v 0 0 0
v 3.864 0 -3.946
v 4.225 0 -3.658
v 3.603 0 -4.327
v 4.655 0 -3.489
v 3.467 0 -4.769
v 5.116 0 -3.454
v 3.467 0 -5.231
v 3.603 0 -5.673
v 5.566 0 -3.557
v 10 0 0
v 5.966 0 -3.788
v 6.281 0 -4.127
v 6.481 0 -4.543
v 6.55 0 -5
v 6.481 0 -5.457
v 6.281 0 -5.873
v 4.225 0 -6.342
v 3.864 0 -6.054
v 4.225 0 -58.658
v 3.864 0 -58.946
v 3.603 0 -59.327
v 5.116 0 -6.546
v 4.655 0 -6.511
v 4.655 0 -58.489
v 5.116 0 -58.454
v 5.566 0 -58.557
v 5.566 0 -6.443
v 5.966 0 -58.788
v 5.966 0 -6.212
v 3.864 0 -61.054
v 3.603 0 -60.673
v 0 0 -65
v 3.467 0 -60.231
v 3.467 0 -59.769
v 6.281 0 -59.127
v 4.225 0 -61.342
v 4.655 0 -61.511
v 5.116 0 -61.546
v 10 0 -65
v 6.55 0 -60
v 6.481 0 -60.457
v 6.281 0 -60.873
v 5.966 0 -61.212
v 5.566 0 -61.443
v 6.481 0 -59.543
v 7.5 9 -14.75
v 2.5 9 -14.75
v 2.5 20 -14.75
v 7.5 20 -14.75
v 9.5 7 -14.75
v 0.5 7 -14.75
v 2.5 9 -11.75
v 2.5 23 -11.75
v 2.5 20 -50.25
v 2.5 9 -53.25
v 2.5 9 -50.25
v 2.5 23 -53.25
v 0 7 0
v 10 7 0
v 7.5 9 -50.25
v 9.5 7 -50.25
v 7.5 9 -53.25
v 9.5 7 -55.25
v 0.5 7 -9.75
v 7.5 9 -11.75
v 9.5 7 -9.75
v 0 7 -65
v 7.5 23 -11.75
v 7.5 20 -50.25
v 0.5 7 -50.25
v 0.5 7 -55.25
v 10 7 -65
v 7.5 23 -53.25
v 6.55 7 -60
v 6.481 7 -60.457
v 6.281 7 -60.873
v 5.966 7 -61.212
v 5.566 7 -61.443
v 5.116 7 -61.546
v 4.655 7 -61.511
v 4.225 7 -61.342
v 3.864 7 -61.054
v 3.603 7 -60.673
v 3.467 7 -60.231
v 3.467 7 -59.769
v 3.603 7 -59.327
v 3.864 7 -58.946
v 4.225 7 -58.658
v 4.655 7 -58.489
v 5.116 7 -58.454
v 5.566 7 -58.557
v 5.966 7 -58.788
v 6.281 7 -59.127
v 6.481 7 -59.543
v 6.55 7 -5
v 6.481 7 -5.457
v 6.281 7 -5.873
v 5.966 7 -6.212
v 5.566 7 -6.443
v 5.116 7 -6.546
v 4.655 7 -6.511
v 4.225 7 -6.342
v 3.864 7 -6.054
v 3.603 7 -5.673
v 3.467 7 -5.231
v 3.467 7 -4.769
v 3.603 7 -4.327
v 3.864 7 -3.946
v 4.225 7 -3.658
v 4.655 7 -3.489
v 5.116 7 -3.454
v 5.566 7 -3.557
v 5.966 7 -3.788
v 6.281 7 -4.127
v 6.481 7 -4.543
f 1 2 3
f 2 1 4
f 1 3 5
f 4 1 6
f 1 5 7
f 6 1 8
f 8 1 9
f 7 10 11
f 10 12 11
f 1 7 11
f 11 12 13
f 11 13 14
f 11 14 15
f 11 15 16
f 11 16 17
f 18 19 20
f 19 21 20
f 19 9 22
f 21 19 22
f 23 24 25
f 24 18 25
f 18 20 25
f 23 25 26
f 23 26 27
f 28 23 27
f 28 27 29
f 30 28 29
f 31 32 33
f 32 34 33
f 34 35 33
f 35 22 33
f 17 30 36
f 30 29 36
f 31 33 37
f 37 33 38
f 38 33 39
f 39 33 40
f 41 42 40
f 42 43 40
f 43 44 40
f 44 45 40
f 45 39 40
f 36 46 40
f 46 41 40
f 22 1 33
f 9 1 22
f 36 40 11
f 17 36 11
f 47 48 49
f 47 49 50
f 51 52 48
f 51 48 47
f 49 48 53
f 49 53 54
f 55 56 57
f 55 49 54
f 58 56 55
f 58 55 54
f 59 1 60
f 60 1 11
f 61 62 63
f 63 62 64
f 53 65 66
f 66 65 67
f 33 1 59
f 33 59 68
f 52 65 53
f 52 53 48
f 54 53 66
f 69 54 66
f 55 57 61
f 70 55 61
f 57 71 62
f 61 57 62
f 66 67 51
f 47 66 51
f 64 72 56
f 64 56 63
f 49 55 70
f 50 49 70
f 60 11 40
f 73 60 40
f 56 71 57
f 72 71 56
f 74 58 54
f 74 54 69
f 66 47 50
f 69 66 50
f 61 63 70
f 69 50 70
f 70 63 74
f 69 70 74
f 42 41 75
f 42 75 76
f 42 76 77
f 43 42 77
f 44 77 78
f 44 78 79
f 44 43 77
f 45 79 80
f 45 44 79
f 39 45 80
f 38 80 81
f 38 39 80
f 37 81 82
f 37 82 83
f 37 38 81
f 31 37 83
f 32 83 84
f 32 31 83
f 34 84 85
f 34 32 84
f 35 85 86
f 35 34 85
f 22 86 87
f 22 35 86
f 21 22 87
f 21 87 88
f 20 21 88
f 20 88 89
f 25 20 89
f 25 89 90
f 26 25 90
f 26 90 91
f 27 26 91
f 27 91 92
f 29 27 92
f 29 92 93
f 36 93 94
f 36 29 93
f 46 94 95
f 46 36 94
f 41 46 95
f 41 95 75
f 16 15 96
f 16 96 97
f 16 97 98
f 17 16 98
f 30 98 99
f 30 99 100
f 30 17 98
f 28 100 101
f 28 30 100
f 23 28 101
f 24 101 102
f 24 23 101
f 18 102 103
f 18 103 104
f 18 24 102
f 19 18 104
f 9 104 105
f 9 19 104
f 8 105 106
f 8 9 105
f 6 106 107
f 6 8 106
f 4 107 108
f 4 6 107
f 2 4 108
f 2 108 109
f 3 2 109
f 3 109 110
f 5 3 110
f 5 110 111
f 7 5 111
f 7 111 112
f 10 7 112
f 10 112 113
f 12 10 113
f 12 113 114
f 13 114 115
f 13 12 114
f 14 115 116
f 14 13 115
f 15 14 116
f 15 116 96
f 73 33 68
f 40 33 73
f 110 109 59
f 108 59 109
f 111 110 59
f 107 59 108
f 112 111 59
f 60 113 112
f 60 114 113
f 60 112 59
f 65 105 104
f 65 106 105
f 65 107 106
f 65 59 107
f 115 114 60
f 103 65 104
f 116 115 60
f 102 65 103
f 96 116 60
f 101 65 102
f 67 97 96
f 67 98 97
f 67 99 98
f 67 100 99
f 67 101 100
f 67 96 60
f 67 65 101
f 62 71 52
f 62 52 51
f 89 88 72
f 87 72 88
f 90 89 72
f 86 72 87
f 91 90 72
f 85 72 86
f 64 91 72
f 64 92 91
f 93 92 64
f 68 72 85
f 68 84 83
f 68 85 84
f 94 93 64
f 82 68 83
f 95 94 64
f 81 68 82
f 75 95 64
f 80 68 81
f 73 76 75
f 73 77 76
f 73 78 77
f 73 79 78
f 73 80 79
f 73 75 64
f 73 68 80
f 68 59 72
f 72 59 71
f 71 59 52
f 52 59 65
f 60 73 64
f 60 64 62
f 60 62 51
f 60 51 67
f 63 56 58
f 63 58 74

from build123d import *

# Parameters (mm, degrees)
SKETCH1_W           = 10
SKETCH1_H           = 65
SKETCH1_R           = 1.55
BOSS_EXTRUDE1_DEPTH = 7
SKETCH2_W           = 5
SKETCH2_H           = 3
BOSS_EXTRUDE2_DEPTH = 16
SKETCH3_W           = 5
SKETCH3_H           = 3
BOSS_EXTRUDE3_DEPTH = 35.5
CHAMFER1_SIZE       = 2


with BuildPart() as part:
    # Sketch1 → Boss-Extrude1 (new body)
    with BuildSketch(Plane(origin=(0, 0, 0), x_dir=(1, 0, 0), z_dir=(0, 1, 0))):
        with Locations((5, 32.5)):
            Rectangle(SKETCH1_W, SKETCH1_H)
        with Locations((5, 60)):
            Circle(SKETCH1_R, mode=Mode.SUBTRACT)
        with Locations((5, 5)):
            Circle(SKETCH1_R, mode=Mode.SUBTRACT)
    extrude(amount=BOSS_EXTRUDE1_DEPTH)

    # Sketch2 → Boss-Extrude2 (add)
    with BuildSketch(Plane(origin=(0, 7, 0), x_dir=(1, 0, 0), z_dir=(0, 1, 0))):
        with Locations((5, 51.75)):
            Rectangle(SKETCH2_W, SKETCH2_H)
        with Locations((5, 13.25)):
            Rectangle(SKETCH2_W, SKETCH2_H)
    extrude(amount=BOSS_EXTRUDE2_DEPTH)

    # Sketch3 → Boss-Extrude3 (add)
    with BuildSketch(Plane.XY.offset(-50.25)):
        with Locations((5, 21.5)):
            Rectangle(SKETCH3_W, SKETCH3_H)
    extrude(amount=BOSS_EXTRUDE3_DEPTH)

    # Chamfer1
    chamfer1_edges = [part.edges().sort_by_distance(p)[0] for p in [
        (7.5, 7, -51.75),
        (5, 7, -53.25),
        (2.5, 7, -51.75),
        (7.5, 7, -13.25),
        (2.5, 7, -13.25),
        (5, 7, -11.75),
    ]]
    chamfer(chamfer1_edges, length=CHAMFER1_SIZE)


solid = part.part
